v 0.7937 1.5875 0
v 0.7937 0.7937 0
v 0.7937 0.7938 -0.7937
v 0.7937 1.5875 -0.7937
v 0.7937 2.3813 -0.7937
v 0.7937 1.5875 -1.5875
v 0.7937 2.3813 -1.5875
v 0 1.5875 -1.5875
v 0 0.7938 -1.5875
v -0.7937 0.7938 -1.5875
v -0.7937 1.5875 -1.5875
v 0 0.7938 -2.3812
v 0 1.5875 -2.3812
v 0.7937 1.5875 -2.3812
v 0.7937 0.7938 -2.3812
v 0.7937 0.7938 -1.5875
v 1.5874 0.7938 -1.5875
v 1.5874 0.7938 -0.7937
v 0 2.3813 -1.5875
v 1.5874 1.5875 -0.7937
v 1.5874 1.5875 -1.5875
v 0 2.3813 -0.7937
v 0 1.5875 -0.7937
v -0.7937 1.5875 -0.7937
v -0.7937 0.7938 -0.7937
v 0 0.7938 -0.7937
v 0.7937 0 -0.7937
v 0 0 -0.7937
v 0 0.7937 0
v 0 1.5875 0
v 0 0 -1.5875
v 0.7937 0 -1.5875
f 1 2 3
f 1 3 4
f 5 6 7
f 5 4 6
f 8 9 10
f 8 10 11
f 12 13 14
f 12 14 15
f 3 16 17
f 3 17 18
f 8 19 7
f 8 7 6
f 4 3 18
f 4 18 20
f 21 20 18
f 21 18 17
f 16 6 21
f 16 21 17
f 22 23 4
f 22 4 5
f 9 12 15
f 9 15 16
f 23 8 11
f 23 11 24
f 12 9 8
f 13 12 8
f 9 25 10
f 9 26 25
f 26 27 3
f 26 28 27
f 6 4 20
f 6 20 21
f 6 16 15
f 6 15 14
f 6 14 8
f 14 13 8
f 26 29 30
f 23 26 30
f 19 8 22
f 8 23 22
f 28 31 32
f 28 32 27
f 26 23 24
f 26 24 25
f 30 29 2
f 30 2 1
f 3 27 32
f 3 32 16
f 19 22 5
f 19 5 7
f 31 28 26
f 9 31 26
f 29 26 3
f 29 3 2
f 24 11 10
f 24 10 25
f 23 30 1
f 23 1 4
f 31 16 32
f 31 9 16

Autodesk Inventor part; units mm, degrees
ref_plane "YZ Plane" through (0, 0, 0) normal (1, 0, 0) x (0, 1, 0)
ref_plane "XZ Plane" through (0, 0, 0) normal (0, 1, 0) x (-1, 0, 0)
sketch "Sketch4" plane through (0, 0, 0) normal (1, 0, 0) x (0, 1, 0)
  line L0 (0.7937, 0) -> (1.5875, 0)
  line L1 (1.5875, 0) -> (1.5875, -0.7937)
  line L2 (1.5875, -0.7937) -> (2.3813, -0.7937)
  line L3 (2.3813, -0.7937) -> (2.3813, -1.5875)
  line L4 (2.3813, -1.5875) -> (1.5875, -1.5875)
  line L5 (1.5875, -2.3812) -> (0.7938, -2.3812)
  line L6 (0.7938, -2.3812) -> (0.7938, -1.5875)
  line L7 (0.7938, -1.5875) -> (0, -1.5875)
  line L8 (0, -1.5875) -> (0, -0.7937)
  line L9 (0, -0.7937) -> (0.7938, -0.7937)
  line L10 (0.7938, -0.7937) -> (0.7937, 0)
  line L11 (1.5875, -2.3812) -> (1.5875, -1.5875)
  point P0 (0, 0)
  dimension "d16" = 0.7937
  dimension "d17" = 0.7937
  dimension "d18" = 0.7937
  dimension "d19" = 0.7937
  dimension "d20" = 0.7937
  dimension "d22" = 0.7937
extrude "Extrusion4" add sketch "Sketch4" along normal blind 0.7937
sketch "Sketch5" plane through (0.7937, 0, 0) normal (1, 0, 0) x (0, 0, -1)
  line L0 (1.5875, 0.7938) -> (0.7937, 0.7938)
  line L1 (0.7937, 0.7938) -> (0.7937, 1.5875)
  line L2 (0.7937, 1.5875) -> (1.5875, 1.5875)
  line L3 (1.5875, 1.5875) -> (1.5875, 0.7938)
  point P0 (0, 0)
extrude "Extrusion5" add sketch "Sketch5" along normal blind 0.7937
sketch "Sketch6" plane through (0, 0, 0) normal (-1, 0, 0) x (0, 0, 1)
  line L0 (-1.5875, 1.5875) -> (-0.7937, 1.5875)
  line L1 (-0.7937, 1.5875) -> (-0.7937, 0.7938)
  line L2 (-0.7937, 0.7938) -> (-1.5875, 0.7938)
  line L3 (-1.5875, 0.7938) -> (-1.5875, 1.5875)
  point P0 (0, 0)
extrude "Extrusion6" add sketch "Sketch6" along normal blind 0.7937
ref_plane "Work Plane3" through (0, 0.7938, -1.1906) normal (0, 0, 1) x (1, 0, 0)
sketch "Sketch7" plane through (0, 0.7938, -1.1906) normal (0, 0, 1) x (1, 0, 0)
  line L0 (0, 0) -> (0, -0.7937) projected
  line L1 (0.7937, 0.7937) -> (1.5875, 0.7937) projected
  line L2 (0, 0) -> (0.7937, 0.7937)
  point P0 (0.3969, 0.3969)
